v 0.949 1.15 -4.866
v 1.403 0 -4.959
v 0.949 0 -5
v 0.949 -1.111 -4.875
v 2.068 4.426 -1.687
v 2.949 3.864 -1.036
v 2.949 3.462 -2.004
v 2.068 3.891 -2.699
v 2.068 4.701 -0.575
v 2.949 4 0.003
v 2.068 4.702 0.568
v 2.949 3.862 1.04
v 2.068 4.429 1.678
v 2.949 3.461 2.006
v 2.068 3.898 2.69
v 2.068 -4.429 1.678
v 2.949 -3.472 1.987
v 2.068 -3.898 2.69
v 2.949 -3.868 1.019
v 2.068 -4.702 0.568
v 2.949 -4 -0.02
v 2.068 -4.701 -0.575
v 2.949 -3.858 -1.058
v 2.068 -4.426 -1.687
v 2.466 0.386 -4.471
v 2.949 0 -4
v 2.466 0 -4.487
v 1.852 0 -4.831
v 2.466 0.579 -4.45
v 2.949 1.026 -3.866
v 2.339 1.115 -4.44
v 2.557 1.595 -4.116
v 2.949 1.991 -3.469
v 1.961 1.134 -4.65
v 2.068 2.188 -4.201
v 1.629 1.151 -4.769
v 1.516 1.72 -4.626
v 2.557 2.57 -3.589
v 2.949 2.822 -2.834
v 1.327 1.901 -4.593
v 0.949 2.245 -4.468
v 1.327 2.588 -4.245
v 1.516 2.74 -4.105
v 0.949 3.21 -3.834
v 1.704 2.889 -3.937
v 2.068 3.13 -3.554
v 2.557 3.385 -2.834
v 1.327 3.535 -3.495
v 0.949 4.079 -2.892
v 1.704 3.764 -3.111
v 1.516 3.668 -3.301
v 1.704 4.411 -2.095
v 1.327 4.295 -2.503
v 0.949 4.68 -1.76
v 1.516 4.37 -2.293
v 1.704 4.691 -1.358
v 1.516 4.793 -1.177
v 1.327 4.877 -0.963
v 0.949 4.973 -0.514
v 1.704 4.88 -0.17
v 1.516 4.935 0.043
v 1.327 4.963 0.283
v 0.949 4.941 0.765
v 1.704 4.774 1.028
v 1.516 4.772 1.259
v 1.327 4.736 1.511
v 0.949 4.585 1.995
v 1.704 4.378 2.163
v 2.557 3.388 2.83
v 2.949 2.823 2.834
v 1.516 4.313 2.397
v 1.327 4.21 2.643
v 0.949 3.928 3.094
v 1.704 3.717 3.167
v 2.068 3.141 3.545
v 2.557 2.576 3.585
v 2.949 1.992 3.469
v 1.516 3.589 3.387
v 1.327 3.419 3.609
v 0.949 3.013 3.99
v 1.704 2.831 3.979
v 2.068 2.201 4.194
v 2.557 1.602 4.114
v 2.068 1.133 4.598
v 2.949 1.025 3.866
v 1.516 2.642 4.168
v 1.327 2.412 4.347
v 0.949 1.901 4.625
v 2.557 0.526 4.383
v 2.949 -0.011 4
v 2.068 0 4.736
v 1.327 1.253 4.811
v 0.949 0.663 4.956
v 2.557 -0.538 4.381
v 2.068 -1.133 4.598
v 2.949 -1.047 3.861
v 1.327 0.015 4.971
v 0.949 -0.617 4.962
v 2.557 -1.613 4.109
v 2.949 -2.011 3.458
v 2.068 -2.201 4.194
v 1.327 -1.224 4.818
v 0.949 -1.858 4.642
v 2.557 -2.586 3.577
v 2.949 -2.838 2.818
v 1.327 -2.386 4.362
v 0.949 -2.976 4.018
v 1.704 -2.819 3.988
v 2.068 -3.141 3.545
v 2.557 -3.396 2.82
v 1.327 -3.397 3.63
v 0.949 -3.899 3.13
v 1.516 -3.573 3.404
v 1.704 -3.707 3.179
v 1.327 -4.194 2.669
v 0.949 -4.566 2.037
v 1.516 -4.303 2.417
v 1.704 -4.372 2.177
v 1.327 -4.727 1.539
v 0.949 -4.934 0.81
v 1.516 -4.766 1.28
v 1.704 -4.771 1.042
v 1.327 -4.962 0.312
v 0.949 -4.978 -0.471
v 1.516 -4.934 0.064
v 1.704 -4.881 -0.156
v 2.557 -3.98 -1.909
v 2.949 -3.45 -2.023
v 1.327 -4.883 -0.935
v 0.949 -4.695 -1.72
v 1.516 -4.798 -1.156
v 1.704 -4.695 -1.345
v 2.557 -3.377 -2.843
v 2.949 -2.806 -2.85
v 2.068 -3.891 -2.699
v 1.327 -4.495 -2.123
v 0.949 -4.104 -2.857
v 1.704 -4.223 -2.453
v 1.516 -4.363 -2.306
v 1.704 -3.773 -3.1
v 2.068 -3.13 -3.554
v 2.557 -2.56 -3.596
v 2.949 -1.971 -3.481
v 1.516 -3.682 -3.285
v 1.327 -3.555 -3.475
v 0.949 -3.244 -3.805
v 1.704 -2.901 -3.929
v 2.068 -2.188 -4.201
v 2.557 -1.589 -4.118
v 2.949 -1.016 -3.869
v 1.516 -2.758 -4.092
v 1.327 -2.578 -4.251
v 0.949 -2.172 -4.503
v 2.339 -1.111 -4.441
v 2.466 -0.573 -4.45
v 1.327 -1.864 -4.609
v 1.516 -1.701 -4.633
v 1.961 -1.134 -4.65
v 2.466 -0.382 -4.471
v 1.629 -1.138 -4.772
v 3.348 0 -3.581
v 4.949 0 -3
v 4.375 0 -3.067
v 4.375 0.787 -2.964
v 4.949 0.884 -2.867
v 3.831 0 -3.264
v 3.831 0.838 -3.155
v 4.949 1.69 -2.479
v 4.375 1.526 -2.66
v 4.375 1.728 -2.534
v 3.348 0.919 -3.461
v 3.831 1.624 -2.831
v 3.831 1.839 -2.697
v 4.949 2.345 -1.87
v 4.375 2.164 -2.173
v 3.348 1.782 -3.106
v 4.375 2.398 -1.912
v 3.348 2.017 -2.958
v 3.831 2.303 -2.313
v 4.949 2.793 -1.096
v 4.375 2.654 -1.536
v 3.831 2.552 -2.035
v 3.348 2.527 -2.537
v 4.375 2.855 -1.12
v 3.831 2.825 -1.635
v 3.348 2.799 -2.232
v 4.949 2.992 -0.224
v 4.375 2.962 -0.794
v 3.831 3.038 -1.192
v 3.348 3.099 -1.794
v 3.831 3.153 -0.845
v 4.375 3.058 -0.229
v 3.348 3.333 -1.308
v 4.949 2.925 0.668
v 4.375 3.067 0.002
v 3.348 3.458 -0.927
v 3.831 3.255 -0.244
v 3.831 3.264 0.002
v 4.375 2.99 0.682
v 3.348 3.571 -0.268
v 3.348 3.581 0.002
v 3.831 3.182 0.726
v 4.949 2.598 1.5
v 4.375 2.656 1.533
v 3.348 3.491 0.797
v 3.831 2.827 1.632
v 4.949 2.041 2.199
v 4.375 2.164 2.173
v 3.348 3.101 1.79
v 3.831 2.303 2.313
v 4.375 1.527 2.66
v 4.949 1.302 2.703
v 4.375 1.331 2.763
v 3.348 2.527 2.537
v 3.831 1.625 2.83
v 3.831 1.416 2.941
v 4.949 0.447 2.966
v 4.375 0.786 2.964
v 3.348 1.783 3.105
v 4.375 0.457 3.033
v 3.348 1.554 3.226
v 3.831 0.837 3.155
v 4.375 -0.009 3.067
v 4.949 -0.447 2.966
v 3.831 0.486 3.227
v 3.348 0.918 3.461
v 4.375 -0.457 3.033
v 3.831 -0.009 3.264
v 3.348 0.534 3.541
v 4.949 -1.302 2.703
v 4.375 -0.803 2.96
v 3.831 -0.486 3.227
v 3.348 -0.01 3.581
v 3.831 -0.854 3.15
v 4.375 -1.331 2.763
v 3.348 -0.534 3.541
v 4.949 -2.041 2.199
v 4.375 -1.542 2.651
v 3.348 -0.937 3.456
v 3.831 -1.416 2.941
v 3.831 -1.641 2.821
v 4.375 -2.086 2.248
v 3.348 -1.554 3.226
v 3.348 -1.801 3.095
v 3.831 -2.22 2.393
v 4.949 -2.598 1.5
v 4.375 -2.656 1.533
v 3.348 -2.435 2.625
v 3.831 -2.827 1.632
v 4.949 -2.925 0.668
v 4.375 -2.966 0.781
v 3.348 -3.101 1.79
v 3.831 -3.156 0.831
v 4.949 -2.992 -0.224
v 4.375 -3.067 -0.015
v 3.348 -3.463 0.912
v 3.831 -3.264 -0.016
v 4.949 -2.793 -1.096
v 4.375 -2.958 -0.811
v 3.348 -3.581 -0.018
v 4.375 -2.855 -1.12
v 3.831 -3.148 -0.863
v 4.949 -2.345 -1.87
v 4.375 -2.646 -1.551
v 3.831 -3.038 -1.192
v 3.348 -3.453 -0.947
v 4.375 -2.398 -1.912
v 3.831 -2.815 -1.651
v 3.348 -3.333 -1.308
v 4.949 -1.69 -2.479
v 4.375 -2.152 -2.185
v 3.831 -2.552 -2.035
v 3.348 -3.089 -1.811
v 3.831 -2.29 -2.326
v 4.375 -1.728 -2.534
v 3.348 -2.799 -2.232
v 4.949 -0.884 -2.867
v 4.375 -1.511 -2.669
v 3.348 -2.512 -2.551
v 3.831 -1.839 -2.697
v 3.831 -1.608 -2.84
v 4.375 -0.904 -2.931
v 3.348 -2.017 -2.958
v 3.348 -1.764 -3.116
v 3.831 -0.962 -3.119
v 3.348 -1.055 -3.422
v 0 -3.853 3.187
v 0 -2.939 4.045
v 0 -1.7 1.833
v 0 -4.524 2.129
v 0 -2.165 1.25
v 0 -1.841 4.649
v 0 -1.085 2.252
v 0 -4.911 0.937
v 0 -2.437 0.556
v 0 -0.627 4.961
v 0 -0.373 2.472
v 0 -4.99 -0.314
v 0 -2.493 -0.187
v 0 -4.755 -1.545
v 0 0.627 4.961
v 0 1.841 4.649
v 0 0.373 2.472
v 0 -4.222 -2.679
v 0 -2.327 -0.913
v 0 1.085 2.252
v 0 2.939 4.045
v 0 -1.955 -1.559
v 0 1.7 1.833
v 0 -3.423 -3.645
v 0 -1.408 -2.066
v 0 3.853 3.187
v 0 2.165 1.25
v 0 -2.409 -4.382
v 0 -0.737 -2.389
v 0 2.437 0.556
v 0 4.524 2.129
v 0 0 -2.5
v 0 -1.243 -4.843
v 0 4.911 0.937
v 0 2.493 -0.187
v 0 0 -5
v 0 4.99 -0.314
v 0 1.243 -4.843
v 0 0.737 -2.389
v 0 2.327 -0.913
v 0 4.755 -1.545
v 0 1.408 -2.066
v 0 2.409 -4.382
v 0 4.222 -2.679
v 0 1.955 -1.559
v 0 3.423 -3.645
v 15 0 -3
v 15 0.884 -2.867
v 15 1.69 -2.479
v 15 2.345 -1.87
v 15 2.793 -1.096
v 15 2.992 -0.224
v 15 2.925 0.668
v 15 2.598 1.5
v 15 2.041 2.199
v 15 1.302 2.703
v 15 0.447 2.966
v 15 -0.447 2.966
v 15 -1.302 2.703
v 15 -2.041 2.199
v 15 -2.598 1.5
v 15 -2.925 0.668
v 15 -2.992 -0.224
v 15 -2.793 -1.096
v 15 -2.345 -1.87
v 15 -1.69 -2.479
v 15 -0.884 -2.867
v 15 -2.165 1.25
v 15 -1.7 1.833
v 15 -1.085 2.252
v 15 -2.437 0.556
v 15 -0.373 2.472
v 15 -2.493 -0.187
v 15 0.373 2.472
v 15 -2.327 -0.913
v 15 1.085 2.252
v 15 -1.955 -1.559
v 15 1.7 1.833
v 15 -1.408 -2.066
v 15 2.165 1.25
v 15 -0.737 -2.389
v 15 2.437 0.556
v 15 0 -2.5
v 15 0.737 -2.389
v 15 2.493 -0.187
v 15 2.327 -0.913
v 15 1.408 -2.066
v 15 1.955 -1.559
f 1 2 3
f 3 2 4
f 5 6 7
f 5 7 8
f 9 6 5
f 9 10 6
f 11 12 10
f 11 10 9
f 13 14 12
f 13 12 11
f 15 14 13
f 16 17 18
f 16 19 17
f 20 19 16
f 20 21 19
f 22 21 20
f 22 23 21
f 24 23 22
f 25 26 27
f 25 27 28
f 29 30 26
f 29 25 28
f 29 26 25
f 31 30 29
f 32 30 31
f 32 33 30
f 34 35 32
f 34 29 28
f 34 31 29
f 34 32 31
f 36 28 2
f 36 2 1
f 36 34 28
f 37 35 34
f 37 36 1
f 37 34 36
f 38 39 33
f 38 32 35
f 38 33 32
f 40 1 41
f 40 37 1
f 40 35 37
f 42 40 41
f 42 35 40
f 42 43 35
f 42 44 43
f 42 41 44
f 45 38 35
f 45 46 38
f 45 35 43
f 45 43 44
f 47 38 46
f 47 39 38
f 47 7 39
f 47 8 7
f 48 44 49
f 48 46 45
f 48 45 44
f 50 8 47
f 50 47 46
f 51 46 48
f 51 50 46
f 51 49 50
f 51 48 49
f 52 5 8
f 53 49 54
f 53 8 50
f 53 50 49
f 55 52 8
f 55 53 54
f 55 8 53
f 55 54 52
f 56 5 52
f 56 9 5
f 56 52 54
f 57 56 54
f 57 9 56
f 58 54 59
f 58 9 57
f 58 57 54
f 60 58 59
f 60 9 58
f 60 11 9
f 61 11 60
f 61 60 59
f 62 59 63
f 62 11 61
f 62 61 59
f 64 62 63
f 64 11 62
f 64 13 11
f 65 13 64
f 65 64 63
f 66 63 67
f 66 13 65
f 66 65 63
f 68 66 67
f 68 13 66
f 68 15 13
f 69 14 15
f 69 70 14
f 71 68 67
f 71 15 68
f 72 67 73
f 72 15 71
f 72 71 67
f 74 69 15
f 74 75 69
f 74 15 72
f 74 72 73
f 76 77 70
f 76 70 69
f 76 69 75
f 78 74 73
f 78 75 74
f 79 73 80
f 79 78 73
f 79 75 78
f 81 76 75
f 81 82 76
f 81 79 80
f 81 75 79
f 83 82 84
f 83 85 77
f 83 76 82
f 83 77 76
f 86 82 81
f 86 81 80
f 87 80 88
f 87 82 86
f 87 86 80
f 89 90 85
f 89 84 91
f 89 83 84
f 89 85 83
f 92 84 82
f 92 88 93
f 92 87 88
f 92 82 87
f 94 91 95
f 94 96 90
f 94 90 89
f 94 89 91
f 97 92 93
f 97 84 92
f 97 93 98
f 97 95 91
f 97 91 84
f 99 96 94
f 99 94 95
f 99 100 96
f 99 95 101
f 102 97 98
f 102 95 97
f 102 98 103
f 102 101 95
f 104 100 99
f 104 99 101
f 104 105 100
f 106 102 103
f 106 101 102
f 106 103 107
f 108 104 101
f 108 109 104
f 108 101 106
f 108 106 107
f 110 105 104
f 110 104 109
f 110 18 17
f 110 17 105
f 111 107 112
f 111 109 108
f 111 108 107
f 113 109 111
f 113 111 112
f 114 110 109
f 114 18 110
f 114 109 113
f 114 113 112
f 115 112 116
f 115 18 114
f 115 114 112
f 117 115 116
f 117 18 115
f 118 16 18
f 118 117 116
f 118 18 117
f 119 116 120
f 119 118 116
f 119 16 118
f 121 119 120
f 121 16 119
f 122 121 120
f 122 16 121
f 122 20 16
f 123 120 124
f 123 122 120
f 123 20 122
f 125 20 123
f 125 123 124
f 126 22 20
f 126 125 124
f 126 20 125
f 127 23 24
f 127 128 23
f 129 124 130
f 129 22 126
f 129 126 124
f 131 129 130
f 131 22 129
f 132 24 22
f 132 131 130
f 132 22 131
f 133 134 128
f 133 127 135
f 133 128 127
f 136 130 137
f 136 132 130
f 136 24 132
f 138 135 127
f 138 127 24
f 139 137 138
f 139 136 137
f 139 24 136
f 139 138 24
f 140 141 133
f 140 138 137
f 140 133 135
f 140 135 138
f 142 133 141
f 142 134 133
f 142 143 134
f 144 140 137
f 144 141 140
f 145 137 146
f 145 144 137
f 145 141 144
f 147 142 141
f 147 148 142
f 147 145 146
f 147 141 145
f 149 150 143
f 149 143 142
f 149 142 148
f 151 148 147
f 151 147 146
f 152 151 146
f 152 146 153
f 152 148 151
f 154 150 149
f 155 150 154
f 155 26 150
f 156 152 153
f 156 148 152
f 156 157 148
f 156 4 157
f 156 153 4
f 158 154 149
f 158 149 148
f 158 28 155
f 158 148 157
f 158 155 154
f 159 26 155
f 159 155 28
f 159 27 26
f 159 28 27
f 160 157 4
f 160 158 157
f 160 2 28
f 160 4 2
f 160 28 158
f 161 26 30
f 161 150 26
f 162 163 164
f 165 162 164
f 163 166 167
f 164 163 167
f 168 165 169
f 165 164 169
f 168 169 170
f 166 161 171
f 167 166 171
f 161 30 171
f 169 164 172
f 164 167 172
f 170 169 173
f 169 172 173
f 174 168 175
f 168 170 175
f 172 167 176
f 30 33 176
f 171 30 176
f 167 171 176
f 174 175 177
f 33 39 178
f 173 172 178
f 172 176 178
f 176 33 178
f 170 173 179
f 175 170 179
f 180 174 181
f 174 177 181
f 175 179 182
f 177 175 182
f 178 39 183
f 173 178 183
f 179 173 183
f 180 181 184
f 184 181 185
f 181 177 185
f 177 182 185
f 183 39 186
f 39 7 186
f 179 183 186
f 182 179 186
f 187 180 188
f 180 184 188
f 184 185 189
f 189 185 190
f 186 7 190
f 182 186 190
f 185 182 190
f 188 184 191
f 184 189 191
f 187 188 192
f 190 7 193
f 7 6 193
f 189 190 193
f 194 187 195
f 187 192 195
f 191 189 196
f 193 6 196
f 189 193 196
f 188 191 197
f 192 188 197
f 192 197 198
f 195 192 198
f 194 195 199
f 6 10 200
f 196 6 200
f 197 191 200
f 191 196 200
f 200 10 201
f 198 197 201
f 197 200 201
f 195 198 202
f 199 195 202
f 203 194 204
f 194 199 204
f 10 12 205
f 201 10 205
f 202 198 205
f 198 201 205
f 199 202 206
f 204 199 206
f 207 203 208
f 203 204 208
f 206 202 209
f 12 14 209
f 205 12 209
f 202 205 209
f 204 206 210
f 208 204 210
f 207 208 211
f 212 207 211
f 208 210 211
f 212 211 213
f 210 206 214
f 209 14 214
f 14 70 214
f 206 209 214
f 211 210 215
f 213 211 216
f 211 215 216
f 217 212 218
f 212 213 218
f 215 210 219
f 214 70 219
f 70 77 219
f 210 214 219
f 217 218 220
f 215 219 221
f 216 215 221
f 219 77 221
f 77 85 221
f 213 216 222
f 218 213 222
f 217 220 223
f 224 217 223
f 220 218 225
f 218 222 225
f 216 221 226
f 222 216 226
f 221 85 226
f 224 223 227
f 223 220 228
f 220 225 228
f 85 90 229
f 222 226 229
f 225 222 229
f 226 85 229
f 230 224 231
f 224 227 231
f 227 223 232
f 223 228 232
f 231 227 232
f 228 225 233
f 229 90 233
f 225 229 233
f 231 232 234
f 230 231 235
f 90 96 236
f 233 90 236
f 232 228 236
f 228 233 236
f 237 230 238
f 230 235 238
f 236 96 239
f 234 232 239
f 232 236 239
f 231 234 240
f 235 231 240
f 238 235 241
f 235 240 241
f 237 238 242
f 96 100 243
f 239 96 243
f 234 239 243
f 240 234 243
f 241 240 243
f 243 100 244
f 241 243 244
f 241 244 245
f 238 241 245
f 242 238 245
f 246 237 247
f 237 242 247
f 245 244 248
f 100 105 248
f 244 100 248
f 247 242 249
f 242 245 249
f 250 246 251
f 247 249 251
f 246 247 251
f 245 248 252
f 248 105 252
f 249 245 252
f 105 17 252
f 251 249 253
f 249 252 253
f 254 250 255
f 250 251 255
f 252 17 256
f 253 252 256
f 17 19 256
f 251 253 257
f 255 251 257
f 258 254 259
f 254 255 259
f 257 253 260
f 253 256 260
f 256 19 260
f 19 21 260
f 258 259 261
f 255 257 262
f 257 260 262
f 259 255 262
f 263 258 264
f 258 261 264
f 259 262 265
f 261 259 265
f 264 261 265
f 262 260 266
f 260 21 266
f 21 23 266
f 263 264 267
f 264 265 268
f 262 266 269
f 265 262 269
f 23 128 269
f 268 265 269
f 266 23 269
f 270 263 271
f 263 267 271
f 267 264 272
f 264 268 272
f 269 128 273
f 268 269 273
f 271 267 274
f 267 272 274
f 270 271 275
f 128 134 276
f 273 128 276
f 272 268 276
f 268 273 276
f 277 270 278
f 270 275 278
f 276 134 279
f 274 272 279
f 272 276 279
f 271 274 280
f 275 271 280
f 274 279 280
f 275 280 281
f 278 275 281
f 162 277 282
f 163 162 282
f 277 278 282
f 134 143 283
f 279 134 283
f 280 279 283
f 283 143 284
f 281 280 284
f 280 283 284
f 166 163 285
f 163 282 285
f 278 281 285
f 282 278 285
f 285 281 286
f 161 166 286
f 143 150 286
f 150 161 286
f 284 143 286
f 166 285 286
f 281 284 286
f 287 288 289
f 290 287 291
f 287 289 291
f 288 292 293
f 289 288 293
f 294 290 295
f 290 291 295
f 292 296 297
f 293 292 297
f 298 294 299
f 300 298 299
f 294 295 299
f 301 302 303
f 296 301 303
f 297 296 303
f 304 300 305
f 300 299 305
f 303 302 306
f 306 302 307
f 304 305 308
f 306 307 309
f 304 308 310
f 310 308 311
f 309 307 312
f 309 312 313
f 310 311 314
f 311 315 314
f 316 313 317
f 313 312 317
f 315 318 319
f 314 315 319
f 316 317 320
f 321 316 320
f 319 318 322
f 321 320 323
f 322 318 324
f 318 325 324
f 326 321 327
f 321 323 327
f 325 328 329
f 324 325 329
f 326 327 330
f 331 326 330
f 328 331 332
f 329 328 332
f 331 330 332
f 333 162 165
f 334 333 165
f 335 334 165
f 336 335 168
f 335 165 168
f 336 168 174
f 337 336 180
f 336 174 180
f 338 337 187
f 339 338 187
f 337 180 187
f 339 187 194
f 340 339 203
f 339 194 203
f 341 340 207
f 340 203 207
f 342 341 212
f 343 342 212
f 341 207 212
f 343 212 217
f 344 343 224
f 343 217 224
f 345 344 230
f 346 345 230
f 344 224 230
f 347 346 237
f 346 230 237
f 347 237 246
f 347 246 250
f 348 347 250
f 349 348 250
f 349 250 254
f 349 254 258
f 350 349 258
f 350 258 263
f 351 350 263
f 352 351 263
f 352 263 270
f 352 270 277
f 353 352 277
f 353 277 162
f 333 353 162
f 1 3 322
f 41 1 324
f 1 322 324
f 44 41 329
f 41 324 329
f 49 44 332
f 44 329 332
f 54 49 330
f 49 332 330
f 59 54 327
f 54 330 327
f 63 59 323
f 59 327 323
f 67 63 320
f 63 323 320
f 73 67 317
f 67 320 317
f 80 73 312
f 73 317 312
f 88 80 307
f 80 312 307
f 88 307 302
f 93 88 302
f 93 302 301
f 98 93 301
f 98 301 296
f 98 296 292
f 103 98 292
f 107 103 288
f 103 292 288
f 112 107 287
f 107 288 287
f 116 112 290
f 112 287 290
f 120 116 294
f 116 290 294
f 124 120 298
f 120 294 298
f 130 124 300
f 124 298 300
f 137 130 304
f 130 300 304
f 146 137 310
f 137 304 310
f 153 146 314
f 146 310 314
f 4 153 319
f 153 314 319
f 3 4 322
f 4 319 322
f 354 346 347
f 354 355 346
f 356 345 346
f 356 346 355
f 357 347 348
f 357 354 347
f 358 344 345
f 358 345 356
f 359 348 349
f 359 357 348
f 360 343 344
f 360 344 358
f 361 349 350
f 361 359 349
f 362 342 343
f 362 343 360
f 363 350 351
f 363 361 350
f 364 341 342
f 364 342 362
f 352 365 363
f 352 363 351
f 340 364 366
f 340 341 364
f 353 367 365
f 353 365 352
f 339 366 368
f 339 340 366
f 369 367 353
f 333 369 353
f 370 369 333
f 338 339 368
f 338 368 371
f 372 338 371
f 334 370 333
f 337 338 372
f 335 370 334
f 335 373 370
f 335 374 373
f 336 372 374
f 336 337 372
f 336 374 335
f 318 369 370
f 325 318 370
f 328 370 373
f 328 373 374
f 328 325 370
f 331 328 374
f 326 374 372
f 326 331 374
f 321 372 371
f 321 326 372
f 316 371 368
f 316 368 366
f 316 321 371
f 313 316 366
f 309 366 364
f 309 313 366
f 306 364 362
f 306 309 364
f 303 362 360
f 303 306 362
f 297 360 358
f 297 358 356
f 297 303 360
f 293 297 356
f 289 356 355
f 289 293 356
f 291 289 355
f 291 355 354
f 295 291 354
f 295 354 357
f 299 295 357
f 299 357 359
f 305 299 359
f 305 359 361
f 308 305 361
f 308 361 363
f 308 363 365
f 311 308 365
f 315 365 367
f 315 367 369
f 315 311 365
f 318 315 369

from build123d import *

# Parameters (mm, degrees)
SKETCH1_R           = 3
SKETCH1_R_2         = 2.5000000000000004
BOSS_EXTRUDE1_DEPTH = 15
SKETCH2_R           = 5
SKETCH2_R_2         = 3.0000000000000004
BOSS_EXTRUDE2_DEPTH = 2.5
FILLET1_R           = 2.5
FILLET2_R           = 2.5


with BuildPart() as part:
    # Sketch1 → Boss-Extrude1 (new body)
    with BuildSketch(Plane(origin=(0, 0, 0), x_dir=(0, 0, -1), z_dir=(1, 0, 0))):
        Circle(SKETCH1_R)
        Circle(SKETCH1_R_2, mode=Mode.SUBTRACT)
    extrude(amount=BOSS_EXTRUDE1_DEPTH)

    # Sketch2 → Boss-Extrude2 (add)
    with BuildSketch(Plane(origin=(0, 0, 0), x_dir=(0, 0, -1), z_dir=(1, 0, 0))):
        Circle(SKETCH2_R)
        Circle(SKETCH2_R_2, mode=Mode.SUBTRACT)
    extrude(amount=BOSS_EXTRUDE2_DEPTH)

    # Fillet1
    # the kernel refuses this fillet: 2.5 mm, written as the material it adds along each edge
    with BuildSketch(Plane(origin=(2.5, 0, 0), x_dir=(0, 0, -1), z_dir=(0, -1, 0))) as fillet1_piece_1:
        with BuildLine():
            CenterArc((5.5, 2.449489742786441), FILLET1_R, 180, 78.4630409671995)
            Line((5.0000000000006395, 3.13216e-12), (4.990000000000652, -0.04898979485253419))
            ThreePointArc((4.990000000000652, -0.04898979485253419), (4.00000000000032, -0.04999999999999982), (3.0000000000000004, -0.04999999999999982))
            Line((3.0000000000000004, -0.04999999999999982), (2.9500000000000006, 0))
            Line((2.9500000000000006, 0), (2.95, 2.449489742786441))
            Line((2.95, 2.449489742786441), (3, 2.449489742786441))
        make_face()
    revolve(axis=Axis((2.5, 0, 0), (1, 0, 0)))

    # Fillet2
    fillet2_edges = [part.edges().sort_by_distance(p)[0] for p in [
        (2.5, 6.1e-16, 5),
    ]]
    fillet(fillet2_edges, radius=FILLET2_R)


solid = part.part
